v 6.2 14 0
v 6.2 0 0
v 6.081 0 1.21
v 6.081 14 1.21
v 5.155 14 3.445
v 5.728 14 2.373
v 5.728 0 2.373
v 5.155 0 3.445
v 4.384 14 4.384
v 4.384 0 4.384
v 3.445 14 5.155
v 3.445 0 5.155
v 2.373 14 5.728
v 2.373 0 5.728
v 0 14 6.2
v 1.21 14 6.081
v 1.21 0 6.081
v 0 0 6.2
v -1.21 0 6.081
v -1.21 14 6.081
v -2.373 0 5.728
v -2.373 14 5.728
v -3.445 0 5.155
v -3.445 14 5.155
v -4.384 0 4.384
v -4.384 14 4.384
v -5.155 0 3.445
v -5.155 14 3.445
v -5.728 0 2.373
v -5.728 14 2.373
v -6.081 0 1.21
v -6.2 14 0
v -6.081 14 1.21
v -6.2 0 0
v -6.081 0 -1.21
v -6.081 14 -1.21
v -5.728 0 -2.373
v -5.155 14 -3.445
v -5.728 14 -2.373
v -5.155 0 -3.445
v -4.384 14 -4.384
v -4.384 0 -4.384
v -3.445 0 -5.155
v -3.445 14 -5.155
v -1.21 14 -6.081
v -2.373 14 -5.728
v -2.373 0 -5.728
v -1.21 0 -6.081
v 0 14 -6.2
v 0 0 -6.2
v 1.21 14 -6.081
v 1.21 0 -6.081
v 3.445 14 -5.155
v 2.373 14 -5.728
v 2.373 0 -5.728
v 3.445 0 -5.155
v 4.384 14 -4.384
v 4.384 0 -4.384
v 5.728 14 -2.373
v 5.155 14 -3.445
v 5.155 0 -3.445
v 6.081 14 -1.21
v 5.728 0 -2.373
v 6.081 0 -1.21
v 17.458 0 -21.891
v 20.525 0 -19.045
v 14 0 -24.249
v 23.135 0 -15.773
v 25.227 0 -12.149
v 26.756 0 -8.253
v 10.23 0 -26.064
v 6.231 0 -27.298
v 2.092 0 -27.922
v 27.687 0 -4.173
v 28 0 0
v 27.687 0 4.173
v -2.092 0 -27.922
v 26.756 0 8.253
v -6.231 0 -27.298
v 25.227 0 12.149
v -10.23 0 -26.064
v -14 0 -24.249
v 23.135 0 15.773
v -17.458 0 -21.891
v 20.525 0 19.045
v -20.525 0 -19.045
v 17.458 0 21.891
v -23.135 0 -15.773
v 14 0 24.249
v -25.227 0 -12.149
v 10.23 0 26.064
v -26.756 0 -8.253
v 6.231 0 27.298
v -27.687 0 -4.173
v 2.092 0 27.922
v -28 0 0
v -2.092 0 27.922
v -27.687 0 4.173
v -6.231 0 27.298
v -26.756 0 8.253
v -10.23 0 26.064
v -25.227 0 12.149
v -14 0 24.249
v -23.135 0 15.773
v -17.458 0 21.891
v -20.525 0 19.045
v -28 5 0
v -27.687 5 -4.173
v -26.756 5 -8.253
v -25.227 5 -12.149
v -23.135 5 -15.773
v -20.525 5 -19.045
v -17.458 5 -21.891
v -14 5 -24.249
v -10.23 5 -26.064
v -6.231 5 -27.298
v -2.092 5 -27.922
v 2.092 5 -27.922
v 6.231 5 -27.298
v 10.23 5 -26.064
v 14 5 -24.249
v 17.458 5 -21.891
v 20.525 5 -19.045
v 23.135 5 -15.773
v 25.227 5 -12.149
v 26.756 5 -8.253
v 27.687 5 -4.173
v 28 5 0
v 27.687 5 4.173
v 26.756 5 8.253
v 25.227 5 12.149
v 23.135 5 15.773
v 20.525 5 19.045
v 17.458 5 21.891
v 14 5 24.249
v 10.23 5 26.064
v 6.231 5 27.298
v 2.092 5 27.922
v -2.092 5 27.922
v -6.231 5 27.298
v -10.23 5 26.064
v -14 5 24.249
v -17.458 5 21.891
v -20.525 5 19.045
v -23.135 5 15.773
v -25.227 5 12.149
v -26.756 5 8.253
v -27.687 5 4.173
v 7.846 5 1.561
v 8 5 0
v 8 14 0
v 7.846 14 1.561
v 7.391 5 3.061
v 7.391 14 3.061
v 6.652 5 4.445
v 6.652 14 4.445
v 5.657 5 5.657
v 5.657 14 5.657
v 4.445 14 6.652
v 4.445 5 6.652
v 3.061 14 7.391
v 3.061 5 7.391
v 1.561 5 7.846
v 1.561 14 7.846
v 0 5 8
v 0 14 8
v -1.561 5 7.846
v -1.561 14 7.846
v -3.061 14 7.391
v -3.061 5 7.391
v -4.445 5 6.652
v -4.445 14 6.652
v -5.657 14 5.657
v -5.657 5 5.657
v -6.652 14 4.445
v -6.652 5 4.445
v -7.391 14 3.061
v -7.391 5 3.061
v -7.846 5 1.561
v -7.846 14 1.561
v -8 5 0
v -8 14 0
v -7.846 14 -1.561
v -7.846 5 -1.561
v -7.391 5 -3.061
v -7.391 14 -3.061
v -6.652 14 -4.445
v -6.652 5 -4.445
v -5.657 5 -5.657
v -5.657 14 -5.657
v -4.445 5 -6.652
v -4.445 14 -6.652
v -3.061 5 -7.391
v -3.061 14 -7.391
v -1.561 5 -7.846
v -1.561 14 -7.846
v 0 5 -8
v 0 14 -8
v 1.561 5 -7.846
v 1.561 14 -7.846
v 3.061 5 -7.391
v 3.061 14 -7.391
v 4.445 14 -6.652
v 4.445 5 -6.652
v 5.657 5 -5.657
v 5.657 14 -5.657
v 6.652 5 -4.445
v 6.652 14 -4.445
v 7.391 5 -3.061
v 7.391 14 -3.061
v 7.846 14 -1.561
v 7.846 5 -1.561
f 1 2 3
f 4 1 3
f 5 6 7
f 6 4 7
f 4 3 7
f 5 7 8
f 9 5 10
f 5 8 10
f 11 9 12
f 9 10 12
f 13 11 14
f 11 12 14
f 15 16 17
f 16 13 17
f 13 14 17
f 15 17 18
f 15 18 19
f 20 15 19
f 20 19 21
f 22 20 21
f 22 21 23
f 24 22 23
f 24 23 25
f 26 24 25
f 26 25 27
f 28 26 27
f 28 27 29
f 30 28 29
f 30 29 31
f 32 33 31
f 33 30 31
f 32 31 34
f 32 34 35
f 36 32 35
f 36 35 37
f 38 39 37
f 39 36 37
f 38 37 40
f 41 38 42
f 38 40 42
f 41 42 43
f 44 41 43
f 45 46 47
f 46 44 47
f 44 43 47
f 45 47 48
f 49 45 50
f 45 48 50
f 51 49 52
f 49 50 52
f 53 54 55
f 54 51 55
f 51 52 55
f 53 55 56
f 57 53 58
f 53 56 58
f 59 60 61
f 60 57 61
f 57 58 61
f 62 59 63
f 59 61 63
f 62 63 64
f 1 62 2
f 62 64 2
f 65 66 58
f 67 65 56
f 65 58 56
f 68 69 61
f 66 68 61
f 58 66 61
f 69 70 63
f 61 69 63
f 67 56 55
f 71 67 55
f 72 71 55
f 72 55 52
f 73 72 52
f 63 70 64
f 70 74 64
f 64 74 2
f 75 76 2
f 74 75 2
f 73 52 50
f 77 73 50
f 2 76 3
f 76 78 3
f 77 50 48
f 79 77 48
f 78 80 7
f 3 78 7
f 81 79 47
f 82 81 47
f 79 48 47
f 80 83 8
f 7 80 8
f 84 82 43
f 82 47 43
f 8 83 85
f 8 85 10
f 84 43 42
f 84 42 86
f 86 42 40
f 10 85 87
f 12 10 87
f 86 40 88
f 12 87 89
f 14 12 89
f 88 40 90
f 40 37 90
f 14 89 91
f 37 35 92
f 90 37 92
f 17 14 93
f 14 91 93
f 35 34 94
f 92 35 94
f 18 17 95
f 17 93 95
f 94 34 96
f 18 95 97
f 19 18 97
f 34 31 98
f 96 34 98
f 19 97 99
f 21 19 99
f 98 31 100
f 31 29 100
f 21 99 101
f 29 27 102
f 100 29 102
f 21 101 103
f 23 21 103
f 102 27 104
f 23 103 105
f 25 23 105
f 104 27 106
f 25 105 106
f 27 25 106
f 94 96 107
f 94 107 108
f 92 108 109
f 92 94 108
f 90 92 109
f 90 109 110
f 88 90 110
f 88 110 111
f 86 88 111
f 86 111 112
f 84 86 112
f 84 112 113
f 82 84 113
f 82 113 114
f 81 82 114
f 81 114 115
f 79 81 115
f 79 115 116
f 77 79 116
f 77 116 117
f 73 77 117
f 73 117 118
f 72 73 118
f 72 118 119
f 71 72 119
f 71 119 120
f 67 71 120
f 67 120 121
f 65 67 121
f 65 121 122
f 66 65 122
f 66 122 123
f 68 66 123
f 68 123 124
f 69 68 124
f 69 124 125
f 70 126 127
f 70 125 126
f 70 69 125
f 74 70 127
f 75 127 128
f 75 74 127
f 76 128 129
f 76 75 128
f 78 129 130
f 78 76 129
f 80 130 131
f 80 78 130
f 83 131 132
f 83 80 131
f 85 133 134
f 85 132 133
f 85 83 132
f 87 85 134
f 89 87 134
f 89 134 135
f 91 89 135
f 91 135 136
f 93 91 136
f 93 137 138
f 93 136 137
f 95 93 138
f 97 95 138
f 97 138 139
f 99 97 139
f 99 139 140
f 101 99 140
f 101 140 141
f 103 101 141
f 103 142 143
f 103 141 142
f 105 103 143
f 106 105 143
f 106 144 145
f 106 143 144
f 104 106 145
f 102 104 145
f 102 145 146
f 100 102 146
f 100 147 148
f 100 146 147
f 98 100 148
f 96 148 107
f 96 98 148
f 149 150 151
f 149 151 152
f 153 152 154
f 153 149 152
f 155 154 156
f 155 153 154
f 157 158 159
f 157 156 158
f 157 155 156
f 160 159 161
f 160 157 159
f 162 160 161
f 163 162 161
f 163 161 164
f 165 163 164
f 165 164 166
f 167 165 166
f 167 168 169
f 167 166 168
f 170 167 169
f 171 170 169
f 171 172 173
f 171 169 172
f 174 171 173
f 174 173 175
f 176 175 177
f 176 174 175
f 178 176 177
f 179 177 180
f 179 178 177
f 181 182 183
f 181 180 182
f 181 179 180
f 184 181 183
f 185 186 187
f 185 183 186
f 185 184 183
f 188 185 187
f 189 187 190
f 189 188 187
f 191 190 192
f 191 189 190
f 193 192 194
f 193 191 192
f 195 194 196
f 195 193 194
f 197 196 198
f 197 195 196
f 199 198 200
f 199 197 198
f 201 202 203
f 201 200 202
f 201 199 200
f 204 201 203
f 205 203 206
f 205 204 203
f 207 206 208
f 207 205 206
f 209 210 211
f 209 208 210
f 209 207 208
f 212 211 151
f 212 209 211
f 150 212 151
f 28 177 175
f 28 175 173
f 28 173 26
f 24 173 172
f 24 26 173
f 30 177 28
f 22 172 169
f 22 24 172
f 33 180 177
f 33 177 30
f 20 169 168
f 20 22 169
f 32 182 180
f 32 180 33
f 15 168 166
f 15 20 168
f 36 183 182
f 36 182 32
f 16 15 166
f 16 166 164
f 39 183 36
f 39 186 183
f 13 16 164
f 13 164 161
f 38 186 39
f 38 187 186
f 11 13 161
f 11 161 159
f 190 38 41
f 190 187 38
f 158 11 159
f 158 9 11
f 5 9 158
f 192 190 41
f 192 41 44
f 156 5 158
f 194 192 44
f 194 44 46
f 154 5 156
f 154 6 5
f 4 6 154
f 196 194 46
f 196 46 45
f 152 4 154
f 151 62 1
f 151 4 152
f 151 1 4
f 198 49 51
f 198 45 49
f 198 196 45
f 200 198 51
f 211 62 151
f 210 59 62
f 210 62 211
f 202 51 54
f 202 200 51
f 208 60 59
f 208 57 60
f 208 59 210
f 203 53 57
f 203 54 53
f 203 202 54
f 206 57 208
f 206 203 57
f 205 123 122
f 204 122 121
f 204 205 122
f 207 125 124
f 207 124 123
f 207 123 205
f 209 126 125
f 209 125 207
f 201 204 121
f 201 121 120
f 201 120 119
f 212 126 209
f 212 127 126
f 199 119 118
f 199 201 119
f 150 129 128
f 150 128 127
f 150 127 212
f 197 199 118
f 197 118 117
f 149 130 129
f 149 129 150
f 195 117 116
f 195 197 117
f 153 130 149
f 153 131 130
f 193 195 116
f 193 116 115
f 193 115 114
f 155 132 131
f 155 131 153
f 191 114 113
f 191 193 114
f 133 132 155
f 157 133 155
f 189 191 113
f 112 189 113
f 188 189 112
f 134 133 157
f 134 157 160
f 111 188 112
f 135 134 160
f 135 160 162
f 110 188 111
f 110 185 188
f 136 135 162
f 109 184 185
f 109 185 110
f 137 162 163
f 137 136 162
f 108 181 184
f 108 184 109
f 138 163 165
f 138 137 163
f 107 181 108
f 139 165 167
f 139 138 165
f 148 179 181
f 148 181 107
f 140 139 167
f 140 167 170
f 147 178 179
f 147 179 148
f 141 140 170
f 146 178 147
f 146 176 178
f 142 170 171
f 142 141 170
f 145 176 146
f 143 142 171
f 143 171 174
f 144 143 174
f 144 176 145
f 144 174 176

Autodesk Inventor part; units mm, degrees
ref_plane "YZ Plane" through (0, 0, 0) normal (1, 0, 0) x (0, 1, 0)
ref_plane "XZ Plane" through (0, 0, 0) normal (0, 1, 0) x (-1, 0, 0)
ref_plane "XY Plane" through (0, 0, 0) normal (0, 0, 1) x (1, 0, 0)
sketch "スケッチ1" plane through (0, 0, 0) normal (0, 1, 0) x (-1, 0, 0)
  circle A0 centre (0, 0) radius 29.5
  circle A1 centre (0, 0) radius 28
  dimension "d0" = 59
  dimension "d10" = 56
extrude "押し出し1" add sketch "スケッチ1" along normal blind 5 contours A1
sketch "スケッチ2" plane through (0, 5, 0) normal (0, 1, 0) x (1, 0, 0)
  circle A0 centre (0, 0) radius 6.2
  circle A1 centre (0, 0) radius 8
  dimension "d3" = 16
  dimension "d9" = 12.4
extrude "押し出し2" cut sketch "スケッチ2" against normal blind 5 contours A0
extrude "押し出し3" add sketch "スケッチ2" along normal blind 9
properties part number "maingear"
